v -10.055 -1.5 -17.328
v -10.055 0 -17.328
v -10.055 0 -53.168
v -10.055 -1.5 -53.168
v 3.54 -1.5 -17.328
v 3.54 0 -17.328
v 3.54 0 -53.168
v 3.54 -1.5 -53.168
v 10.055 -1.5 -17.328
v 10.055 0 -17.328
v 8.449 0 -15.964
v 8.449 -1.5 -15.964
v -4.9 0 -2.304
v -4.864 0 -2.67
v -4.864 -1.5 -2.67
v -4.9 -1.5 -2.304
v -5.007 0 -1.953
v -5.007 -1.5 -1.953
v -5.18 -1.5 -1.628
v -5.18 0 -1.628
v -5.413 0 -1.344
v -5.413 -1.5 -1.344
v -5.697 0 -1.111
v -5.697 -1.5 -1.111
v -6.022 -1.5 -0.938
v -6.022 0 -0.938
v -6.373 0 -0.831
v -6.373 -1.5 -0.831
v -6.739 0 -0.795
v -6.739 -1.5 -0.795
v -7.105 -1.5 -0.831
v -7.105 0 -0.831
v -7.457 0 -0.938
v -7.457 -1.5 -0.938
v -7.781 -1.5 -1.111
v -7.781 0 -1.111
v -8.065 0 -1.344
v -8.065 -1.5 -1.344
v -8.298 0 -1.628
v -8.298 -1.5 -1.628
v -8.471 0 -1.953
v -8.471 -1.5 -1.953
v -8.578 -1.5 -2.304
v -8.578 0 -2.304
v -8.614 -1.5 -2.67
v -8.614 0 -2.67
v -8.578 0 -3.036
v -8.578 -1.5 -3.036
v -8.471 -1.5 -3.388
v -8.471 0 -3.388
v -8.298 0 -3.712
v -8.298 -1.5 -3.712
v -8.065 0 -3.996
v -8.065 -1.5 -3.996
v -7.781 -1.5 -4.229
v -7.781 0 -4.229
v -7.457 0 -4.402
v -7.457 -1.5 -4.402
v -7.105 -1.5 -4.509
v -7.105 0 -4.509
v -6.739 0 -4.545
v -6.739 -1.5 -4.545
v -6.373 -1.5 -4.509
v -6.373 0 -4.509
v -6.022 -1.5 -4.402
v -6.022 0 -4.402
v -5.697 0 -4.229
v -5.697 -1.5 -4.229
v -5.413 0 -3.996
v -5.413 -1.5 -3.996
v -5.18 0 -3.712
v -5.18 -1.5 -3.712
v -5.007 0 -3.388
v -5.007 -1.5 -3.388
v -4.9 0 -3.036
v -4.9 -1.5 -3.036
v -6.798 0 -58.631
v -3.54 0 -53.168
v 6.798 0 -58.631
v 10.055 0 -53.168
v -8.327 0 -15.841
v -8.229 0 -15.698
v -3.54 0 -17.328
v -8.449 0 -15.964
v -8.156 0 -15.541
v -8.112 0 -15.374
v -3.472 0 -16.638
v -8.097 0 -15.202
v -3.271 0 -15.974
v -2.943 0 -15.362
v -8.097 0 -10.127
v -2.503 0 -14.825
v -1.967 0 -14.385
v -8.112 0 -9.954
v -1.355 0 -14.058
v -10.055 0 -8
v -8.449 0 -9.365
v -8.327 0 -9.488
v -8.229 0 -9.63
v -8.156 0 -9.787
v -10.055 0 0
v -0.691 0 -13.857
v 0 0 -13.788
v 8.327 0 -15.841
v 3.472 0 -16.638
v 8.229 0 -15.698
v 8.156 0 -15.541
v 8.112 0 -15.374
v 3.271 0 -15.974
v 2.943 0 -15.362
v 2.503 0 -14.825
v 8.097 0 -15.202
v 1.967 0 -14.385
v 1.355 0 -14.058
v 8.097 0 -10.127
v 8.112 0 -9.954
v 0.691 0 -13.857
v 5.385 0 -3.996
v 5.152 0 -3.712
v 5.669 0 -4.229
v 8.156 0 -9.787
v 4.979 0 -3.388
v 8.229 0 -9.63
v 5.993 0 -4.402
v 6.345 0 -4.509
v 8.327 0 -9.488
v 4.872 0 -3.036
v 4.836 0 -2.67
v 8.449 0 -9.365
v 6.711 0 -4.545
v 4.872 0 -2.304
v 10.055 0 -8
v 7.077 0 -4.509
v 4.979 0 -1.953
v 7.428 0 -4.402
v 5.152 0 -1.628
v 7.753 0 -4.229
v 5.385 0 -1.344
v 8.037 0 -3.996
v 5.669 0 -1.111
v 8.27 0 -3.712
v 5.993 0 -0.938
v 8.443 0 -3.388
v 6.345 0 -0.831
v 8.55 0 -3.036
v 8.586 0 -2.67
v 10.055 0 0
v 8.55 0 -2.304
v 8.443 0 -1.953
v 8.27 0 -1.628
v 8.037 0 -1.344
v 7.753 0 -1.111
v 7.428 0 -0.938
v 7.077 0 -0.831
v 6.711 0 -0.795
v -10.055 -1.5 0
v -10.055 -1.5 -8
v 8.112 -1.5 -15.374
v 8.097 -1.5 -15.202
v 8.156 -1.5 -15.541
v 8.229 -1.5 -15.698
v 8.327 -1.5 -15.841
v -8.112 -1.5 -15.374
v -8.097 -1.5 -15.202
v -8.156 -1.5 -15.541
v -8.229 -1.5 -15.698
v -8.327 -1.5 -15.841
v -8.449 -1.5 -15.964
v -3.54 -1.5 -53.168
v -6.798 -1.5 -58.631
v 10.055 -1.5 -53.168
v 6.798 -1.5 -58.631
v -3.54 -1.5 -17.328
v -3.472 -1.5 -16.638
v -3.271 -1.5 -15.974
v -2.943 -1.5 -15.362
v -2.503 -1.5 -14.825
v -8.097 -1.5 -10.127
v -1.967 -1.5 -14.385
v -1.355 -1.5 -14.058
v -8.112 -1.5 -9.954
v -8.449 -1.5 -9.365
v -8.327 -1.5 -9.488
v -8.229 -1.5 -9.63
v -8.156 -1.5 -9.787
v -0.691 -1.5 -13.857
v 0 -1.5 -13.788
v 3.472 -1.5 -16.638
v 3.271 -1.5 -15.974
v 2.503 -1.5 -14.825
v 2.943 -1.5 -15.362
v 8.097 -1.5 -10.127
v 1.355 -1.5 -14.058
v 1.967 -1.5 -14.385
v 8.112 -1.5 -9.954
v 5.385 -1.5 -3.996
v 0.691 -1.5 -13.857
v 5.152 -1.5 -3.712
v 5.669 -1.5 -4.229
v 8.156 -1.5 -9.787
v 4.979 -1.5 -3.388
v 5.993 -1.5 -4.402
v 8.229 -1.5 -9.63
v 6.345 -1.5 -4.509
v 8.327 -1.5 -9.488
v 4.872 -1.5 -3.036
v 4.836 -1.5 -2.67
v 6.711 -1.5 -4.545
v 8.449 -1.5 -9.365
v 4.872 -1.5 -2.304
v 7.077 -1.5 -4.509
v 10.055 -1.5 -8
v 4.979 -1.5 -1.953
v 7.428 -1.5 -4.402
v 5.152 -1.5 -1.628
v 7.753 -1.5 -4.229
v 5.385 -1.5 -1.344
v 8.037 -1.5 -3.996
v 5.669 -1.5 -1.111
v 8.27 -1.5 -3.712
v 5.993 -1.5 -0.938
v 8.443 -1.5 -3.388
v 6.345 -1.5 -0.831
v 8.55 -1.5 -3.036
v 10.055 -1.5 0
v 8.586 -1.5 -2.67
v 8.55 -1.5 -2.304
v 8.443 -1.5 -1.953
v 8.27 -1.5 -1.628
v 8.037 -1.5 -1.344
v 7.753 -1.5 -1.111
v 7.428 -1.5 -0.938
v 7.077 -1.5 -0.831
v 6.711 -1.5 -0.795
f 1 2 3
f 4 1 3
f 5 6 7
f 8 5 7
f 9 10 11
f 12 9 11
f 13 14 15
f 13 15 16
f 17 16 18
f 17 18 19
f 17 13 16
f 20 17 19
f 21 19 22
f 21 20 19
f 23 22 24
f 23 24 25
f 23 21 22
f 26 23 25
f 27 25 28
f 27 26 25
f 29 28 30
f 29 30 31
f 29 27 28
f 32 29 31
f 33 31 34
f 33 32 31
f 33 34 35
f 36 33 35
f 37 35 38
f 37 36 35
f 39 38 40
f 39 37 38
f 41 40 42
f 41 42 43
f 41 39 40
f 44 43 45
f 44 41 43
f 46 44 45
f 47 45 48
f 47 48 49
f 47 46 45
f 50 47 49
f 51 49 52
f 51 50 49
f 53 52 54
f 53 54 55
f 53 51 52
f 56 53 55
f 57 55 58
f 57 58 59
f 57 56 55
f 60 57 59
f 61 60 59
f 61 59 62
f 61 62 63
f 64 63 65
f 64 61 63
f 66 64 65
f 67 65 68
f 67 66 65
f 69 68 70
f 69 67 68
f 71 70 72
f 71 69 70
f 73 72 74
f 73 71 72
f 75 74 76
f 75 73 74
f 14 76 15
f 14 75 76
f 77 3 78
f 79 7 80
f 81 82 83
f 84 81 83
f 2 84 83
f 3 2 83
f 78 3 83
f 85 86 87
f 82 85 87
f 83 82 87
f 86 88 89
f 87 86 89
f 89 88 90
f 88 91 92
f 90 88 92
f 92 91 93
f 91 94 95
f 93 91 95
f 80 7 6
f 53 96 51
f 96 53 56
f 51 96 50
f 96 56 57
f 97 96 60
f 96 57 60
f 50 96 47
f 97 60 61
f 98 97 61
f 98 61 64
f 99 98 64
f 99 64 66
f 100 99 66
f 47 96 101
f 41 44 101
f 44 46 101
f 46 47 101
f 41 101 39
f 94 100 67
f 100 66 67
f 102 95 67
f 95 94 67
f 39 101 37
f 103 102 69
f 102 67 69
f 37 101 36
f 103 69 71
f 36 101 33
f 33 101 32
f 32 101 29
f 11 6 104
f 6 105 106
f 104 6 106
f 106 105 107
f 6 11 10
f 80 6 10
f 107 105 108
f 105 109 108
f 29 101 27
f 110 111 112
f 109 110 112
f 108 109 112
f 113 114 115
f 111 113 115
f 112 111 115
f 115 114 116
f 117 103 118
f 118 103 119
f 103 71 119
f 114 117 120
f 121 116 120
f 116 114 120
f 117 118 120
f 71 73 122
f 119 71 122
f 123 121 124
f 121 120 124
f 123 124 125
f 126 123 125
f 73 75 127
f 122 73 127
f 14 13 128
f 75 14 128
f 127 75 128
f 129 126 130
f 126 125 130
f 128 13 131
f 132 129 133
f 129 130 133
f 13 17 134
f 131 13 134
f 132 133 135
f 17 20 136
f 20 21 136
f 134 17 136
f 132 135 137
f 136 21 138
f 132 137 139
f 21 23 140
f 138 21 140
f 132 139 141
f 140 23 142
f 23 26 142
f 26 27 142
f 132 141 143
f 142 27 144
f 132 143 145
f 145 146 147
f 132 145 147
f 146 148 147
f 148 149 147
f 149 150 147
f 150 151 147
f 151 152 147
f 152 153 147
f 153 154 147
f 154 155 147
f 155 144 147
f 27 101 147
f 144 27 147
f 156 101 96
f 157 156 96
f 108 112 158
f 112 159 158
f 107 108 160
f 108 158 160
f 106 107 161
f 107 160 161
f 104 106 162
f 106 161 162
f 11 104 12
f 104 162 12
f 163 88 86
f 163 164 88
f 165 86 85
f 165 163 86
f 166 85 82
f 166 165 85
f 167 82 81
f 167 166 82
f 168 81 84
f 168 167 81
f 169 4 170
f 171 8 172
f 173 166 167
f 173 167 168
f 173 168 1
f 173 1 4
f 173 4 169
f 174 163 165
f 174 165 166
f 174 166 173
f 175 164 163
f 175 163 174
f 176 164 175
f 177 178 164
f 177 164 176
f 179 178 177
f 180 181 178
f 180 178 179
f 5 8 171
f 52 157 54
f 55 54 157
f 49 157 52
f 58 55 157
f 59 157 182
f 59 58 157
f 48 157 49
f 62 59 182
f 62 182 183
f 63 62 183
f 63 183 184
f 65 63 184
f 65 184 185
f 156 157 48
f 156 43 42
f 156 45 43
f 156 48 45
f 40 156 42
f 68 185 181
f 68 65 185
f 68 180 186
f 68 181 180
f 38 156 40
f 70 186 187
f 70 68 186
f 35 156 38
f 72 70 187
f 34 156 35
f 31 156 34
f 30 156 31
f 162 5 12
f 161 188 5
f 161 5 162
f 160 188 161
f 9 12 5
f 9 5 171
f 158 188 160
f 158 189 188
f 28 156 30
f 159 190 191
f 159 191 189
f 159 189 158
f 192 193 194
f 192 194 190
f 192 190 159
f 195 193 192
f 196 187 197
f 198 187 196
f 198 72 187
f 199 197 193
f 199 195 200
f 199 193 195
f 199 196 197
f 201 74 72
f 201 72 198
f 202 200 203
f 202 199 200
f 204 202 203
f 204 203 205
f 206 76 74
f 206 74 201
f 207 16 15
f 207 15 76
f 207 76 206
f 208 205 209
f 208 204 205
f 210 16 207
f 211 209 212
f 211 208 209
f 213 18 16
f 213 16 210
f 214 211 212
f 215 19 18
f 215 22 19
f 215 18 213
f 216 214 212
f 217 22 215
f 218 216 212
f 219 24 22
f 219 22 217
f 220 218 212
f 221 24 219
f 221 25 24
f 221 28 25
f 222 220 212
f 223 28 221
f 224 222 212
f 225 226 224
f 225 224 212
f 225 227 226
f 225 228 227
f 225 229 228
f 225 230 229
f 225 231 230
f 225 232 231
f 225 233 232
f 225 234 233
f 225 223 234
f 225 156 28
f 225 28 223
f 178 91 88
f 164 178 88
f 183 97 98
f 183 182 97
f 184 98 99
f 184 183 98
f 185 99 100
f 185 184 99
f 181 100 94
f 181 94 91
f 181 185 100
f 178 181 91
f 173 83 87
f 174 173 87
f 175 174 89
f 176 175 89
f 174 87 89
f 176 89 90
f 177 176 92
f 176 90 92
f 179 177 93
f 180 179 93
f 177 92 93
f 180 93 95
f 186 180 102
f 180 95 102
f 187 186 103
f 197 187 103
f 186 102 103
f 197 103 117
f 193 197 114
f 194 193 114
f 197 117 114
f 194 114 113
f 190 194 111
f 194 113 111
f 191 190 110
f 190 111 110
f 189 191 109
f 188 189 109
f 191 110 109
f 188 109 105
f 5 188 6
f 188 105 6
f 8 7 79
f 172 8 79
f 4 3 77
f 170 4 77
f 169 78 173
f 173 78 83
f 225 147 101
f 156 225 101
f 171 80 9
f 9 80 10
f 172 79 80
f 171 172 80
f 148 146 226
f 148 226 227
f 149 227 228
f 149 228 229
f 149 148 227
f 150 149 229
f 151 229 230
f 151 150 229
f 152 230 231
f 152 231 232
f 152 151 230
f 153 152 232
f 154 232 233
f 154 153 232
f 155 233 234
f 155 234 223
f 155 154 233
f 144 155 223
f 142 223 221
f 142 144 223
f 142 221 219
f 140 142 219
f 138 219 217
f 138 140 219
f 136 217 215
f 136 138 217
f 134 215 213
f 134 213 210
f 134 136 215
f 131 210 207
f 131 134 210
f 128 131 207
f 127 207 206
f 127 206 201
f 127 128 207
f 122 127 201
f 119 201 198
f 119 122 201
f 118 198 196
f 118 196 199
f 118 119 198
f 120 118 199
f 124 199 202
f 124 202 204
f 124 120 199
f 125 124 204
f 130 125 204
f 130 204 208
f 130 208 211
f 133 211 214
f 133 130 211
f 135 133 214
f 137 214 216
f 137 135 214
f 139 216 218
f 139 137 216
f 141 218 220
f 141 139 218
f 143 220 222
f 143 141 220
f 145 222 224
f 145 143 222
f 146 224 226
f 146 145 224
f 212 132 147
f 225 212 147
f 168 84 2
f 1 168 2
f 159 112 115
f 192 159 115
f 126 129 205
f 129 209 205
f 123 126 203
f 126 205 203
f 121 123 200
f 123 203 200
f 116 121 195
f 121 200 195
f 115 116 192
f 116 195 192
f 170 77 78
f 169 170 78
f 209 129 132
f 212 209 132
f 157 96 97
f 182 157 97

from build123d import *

# Parameters (mm, degrees)
F0_R     = 1.875
F1_DEPTH = 1.5
F2_R     = 1


with BuildPart() as f1:
    # F0 (on Front) → F1 (new body)
    with BuildSketch(Plane.XZ):
        with BuildLine():
            Line((10.055, 0), (-10.055, 0))
            Line((-10.055, 0), (-10.055, -8))
            Line((-10.055, -8), (-8.09664, -9.664249))
            Line((-8.09664, -9.664249), (-8.09664, -15.664249))
            Line((-8.09664, -15.664249), (-10.055, -17.328498))
            Line((-10.055, -17.328498), (-10.055, -53.168498))
            Line((-10.055, -53.168498), (-6.7975, -58.630942))
            Line((-6.7975, -58.630942), (-3.54, -53.168498))
            Line((-3.54, -53.168498), (-3.54, -17.328498))
            ThreePointArc((-3.54, -17.328498), (0, -13.788498), (3.54, -17.328498))
            Line((3.54, -17.328498), (3.54, -53.168498))
            Line((3.54, -53.168498), (6.7975, -58.630942))
            Line((6.7975, -58.630942), (10.055, -53.168498))
            Line((10.055, -53.168498), (10.055, -17.328498))
            Line((10.055, -17.328498), (8.09664, -15.664249))
            Line((8.09664, -15.664249), (8.09664, -9.664249))
            Line((8.09664, -9.664249), (10.055, -8))
            Line((10.055, -8), (10.055, 0))
        make_face()
        with Locations((-6.739115, -2.67007)):
            Circle(F0_R, mode=Mode.SUBTRACT)
        with Locations((6.710854, -2.67007)):
            Circle(F0_R, mode=Mode.SUBTRACT)
    extrude(amount=F1_DEPTH)

    # F2
    f2_edges = [f1.edges().sort_by_distance(p)[0] for p in [
        (-8.09664, -0.75, -9.664249),
        (-8.09664, -0.75, -15.664249),
        (8.09664, -0.75, -9.664249),
        (8.09664, -0.75, -15.664249),
    ]]
    fillet(f2_edges, radius=F2_R)


solid = f1.part
